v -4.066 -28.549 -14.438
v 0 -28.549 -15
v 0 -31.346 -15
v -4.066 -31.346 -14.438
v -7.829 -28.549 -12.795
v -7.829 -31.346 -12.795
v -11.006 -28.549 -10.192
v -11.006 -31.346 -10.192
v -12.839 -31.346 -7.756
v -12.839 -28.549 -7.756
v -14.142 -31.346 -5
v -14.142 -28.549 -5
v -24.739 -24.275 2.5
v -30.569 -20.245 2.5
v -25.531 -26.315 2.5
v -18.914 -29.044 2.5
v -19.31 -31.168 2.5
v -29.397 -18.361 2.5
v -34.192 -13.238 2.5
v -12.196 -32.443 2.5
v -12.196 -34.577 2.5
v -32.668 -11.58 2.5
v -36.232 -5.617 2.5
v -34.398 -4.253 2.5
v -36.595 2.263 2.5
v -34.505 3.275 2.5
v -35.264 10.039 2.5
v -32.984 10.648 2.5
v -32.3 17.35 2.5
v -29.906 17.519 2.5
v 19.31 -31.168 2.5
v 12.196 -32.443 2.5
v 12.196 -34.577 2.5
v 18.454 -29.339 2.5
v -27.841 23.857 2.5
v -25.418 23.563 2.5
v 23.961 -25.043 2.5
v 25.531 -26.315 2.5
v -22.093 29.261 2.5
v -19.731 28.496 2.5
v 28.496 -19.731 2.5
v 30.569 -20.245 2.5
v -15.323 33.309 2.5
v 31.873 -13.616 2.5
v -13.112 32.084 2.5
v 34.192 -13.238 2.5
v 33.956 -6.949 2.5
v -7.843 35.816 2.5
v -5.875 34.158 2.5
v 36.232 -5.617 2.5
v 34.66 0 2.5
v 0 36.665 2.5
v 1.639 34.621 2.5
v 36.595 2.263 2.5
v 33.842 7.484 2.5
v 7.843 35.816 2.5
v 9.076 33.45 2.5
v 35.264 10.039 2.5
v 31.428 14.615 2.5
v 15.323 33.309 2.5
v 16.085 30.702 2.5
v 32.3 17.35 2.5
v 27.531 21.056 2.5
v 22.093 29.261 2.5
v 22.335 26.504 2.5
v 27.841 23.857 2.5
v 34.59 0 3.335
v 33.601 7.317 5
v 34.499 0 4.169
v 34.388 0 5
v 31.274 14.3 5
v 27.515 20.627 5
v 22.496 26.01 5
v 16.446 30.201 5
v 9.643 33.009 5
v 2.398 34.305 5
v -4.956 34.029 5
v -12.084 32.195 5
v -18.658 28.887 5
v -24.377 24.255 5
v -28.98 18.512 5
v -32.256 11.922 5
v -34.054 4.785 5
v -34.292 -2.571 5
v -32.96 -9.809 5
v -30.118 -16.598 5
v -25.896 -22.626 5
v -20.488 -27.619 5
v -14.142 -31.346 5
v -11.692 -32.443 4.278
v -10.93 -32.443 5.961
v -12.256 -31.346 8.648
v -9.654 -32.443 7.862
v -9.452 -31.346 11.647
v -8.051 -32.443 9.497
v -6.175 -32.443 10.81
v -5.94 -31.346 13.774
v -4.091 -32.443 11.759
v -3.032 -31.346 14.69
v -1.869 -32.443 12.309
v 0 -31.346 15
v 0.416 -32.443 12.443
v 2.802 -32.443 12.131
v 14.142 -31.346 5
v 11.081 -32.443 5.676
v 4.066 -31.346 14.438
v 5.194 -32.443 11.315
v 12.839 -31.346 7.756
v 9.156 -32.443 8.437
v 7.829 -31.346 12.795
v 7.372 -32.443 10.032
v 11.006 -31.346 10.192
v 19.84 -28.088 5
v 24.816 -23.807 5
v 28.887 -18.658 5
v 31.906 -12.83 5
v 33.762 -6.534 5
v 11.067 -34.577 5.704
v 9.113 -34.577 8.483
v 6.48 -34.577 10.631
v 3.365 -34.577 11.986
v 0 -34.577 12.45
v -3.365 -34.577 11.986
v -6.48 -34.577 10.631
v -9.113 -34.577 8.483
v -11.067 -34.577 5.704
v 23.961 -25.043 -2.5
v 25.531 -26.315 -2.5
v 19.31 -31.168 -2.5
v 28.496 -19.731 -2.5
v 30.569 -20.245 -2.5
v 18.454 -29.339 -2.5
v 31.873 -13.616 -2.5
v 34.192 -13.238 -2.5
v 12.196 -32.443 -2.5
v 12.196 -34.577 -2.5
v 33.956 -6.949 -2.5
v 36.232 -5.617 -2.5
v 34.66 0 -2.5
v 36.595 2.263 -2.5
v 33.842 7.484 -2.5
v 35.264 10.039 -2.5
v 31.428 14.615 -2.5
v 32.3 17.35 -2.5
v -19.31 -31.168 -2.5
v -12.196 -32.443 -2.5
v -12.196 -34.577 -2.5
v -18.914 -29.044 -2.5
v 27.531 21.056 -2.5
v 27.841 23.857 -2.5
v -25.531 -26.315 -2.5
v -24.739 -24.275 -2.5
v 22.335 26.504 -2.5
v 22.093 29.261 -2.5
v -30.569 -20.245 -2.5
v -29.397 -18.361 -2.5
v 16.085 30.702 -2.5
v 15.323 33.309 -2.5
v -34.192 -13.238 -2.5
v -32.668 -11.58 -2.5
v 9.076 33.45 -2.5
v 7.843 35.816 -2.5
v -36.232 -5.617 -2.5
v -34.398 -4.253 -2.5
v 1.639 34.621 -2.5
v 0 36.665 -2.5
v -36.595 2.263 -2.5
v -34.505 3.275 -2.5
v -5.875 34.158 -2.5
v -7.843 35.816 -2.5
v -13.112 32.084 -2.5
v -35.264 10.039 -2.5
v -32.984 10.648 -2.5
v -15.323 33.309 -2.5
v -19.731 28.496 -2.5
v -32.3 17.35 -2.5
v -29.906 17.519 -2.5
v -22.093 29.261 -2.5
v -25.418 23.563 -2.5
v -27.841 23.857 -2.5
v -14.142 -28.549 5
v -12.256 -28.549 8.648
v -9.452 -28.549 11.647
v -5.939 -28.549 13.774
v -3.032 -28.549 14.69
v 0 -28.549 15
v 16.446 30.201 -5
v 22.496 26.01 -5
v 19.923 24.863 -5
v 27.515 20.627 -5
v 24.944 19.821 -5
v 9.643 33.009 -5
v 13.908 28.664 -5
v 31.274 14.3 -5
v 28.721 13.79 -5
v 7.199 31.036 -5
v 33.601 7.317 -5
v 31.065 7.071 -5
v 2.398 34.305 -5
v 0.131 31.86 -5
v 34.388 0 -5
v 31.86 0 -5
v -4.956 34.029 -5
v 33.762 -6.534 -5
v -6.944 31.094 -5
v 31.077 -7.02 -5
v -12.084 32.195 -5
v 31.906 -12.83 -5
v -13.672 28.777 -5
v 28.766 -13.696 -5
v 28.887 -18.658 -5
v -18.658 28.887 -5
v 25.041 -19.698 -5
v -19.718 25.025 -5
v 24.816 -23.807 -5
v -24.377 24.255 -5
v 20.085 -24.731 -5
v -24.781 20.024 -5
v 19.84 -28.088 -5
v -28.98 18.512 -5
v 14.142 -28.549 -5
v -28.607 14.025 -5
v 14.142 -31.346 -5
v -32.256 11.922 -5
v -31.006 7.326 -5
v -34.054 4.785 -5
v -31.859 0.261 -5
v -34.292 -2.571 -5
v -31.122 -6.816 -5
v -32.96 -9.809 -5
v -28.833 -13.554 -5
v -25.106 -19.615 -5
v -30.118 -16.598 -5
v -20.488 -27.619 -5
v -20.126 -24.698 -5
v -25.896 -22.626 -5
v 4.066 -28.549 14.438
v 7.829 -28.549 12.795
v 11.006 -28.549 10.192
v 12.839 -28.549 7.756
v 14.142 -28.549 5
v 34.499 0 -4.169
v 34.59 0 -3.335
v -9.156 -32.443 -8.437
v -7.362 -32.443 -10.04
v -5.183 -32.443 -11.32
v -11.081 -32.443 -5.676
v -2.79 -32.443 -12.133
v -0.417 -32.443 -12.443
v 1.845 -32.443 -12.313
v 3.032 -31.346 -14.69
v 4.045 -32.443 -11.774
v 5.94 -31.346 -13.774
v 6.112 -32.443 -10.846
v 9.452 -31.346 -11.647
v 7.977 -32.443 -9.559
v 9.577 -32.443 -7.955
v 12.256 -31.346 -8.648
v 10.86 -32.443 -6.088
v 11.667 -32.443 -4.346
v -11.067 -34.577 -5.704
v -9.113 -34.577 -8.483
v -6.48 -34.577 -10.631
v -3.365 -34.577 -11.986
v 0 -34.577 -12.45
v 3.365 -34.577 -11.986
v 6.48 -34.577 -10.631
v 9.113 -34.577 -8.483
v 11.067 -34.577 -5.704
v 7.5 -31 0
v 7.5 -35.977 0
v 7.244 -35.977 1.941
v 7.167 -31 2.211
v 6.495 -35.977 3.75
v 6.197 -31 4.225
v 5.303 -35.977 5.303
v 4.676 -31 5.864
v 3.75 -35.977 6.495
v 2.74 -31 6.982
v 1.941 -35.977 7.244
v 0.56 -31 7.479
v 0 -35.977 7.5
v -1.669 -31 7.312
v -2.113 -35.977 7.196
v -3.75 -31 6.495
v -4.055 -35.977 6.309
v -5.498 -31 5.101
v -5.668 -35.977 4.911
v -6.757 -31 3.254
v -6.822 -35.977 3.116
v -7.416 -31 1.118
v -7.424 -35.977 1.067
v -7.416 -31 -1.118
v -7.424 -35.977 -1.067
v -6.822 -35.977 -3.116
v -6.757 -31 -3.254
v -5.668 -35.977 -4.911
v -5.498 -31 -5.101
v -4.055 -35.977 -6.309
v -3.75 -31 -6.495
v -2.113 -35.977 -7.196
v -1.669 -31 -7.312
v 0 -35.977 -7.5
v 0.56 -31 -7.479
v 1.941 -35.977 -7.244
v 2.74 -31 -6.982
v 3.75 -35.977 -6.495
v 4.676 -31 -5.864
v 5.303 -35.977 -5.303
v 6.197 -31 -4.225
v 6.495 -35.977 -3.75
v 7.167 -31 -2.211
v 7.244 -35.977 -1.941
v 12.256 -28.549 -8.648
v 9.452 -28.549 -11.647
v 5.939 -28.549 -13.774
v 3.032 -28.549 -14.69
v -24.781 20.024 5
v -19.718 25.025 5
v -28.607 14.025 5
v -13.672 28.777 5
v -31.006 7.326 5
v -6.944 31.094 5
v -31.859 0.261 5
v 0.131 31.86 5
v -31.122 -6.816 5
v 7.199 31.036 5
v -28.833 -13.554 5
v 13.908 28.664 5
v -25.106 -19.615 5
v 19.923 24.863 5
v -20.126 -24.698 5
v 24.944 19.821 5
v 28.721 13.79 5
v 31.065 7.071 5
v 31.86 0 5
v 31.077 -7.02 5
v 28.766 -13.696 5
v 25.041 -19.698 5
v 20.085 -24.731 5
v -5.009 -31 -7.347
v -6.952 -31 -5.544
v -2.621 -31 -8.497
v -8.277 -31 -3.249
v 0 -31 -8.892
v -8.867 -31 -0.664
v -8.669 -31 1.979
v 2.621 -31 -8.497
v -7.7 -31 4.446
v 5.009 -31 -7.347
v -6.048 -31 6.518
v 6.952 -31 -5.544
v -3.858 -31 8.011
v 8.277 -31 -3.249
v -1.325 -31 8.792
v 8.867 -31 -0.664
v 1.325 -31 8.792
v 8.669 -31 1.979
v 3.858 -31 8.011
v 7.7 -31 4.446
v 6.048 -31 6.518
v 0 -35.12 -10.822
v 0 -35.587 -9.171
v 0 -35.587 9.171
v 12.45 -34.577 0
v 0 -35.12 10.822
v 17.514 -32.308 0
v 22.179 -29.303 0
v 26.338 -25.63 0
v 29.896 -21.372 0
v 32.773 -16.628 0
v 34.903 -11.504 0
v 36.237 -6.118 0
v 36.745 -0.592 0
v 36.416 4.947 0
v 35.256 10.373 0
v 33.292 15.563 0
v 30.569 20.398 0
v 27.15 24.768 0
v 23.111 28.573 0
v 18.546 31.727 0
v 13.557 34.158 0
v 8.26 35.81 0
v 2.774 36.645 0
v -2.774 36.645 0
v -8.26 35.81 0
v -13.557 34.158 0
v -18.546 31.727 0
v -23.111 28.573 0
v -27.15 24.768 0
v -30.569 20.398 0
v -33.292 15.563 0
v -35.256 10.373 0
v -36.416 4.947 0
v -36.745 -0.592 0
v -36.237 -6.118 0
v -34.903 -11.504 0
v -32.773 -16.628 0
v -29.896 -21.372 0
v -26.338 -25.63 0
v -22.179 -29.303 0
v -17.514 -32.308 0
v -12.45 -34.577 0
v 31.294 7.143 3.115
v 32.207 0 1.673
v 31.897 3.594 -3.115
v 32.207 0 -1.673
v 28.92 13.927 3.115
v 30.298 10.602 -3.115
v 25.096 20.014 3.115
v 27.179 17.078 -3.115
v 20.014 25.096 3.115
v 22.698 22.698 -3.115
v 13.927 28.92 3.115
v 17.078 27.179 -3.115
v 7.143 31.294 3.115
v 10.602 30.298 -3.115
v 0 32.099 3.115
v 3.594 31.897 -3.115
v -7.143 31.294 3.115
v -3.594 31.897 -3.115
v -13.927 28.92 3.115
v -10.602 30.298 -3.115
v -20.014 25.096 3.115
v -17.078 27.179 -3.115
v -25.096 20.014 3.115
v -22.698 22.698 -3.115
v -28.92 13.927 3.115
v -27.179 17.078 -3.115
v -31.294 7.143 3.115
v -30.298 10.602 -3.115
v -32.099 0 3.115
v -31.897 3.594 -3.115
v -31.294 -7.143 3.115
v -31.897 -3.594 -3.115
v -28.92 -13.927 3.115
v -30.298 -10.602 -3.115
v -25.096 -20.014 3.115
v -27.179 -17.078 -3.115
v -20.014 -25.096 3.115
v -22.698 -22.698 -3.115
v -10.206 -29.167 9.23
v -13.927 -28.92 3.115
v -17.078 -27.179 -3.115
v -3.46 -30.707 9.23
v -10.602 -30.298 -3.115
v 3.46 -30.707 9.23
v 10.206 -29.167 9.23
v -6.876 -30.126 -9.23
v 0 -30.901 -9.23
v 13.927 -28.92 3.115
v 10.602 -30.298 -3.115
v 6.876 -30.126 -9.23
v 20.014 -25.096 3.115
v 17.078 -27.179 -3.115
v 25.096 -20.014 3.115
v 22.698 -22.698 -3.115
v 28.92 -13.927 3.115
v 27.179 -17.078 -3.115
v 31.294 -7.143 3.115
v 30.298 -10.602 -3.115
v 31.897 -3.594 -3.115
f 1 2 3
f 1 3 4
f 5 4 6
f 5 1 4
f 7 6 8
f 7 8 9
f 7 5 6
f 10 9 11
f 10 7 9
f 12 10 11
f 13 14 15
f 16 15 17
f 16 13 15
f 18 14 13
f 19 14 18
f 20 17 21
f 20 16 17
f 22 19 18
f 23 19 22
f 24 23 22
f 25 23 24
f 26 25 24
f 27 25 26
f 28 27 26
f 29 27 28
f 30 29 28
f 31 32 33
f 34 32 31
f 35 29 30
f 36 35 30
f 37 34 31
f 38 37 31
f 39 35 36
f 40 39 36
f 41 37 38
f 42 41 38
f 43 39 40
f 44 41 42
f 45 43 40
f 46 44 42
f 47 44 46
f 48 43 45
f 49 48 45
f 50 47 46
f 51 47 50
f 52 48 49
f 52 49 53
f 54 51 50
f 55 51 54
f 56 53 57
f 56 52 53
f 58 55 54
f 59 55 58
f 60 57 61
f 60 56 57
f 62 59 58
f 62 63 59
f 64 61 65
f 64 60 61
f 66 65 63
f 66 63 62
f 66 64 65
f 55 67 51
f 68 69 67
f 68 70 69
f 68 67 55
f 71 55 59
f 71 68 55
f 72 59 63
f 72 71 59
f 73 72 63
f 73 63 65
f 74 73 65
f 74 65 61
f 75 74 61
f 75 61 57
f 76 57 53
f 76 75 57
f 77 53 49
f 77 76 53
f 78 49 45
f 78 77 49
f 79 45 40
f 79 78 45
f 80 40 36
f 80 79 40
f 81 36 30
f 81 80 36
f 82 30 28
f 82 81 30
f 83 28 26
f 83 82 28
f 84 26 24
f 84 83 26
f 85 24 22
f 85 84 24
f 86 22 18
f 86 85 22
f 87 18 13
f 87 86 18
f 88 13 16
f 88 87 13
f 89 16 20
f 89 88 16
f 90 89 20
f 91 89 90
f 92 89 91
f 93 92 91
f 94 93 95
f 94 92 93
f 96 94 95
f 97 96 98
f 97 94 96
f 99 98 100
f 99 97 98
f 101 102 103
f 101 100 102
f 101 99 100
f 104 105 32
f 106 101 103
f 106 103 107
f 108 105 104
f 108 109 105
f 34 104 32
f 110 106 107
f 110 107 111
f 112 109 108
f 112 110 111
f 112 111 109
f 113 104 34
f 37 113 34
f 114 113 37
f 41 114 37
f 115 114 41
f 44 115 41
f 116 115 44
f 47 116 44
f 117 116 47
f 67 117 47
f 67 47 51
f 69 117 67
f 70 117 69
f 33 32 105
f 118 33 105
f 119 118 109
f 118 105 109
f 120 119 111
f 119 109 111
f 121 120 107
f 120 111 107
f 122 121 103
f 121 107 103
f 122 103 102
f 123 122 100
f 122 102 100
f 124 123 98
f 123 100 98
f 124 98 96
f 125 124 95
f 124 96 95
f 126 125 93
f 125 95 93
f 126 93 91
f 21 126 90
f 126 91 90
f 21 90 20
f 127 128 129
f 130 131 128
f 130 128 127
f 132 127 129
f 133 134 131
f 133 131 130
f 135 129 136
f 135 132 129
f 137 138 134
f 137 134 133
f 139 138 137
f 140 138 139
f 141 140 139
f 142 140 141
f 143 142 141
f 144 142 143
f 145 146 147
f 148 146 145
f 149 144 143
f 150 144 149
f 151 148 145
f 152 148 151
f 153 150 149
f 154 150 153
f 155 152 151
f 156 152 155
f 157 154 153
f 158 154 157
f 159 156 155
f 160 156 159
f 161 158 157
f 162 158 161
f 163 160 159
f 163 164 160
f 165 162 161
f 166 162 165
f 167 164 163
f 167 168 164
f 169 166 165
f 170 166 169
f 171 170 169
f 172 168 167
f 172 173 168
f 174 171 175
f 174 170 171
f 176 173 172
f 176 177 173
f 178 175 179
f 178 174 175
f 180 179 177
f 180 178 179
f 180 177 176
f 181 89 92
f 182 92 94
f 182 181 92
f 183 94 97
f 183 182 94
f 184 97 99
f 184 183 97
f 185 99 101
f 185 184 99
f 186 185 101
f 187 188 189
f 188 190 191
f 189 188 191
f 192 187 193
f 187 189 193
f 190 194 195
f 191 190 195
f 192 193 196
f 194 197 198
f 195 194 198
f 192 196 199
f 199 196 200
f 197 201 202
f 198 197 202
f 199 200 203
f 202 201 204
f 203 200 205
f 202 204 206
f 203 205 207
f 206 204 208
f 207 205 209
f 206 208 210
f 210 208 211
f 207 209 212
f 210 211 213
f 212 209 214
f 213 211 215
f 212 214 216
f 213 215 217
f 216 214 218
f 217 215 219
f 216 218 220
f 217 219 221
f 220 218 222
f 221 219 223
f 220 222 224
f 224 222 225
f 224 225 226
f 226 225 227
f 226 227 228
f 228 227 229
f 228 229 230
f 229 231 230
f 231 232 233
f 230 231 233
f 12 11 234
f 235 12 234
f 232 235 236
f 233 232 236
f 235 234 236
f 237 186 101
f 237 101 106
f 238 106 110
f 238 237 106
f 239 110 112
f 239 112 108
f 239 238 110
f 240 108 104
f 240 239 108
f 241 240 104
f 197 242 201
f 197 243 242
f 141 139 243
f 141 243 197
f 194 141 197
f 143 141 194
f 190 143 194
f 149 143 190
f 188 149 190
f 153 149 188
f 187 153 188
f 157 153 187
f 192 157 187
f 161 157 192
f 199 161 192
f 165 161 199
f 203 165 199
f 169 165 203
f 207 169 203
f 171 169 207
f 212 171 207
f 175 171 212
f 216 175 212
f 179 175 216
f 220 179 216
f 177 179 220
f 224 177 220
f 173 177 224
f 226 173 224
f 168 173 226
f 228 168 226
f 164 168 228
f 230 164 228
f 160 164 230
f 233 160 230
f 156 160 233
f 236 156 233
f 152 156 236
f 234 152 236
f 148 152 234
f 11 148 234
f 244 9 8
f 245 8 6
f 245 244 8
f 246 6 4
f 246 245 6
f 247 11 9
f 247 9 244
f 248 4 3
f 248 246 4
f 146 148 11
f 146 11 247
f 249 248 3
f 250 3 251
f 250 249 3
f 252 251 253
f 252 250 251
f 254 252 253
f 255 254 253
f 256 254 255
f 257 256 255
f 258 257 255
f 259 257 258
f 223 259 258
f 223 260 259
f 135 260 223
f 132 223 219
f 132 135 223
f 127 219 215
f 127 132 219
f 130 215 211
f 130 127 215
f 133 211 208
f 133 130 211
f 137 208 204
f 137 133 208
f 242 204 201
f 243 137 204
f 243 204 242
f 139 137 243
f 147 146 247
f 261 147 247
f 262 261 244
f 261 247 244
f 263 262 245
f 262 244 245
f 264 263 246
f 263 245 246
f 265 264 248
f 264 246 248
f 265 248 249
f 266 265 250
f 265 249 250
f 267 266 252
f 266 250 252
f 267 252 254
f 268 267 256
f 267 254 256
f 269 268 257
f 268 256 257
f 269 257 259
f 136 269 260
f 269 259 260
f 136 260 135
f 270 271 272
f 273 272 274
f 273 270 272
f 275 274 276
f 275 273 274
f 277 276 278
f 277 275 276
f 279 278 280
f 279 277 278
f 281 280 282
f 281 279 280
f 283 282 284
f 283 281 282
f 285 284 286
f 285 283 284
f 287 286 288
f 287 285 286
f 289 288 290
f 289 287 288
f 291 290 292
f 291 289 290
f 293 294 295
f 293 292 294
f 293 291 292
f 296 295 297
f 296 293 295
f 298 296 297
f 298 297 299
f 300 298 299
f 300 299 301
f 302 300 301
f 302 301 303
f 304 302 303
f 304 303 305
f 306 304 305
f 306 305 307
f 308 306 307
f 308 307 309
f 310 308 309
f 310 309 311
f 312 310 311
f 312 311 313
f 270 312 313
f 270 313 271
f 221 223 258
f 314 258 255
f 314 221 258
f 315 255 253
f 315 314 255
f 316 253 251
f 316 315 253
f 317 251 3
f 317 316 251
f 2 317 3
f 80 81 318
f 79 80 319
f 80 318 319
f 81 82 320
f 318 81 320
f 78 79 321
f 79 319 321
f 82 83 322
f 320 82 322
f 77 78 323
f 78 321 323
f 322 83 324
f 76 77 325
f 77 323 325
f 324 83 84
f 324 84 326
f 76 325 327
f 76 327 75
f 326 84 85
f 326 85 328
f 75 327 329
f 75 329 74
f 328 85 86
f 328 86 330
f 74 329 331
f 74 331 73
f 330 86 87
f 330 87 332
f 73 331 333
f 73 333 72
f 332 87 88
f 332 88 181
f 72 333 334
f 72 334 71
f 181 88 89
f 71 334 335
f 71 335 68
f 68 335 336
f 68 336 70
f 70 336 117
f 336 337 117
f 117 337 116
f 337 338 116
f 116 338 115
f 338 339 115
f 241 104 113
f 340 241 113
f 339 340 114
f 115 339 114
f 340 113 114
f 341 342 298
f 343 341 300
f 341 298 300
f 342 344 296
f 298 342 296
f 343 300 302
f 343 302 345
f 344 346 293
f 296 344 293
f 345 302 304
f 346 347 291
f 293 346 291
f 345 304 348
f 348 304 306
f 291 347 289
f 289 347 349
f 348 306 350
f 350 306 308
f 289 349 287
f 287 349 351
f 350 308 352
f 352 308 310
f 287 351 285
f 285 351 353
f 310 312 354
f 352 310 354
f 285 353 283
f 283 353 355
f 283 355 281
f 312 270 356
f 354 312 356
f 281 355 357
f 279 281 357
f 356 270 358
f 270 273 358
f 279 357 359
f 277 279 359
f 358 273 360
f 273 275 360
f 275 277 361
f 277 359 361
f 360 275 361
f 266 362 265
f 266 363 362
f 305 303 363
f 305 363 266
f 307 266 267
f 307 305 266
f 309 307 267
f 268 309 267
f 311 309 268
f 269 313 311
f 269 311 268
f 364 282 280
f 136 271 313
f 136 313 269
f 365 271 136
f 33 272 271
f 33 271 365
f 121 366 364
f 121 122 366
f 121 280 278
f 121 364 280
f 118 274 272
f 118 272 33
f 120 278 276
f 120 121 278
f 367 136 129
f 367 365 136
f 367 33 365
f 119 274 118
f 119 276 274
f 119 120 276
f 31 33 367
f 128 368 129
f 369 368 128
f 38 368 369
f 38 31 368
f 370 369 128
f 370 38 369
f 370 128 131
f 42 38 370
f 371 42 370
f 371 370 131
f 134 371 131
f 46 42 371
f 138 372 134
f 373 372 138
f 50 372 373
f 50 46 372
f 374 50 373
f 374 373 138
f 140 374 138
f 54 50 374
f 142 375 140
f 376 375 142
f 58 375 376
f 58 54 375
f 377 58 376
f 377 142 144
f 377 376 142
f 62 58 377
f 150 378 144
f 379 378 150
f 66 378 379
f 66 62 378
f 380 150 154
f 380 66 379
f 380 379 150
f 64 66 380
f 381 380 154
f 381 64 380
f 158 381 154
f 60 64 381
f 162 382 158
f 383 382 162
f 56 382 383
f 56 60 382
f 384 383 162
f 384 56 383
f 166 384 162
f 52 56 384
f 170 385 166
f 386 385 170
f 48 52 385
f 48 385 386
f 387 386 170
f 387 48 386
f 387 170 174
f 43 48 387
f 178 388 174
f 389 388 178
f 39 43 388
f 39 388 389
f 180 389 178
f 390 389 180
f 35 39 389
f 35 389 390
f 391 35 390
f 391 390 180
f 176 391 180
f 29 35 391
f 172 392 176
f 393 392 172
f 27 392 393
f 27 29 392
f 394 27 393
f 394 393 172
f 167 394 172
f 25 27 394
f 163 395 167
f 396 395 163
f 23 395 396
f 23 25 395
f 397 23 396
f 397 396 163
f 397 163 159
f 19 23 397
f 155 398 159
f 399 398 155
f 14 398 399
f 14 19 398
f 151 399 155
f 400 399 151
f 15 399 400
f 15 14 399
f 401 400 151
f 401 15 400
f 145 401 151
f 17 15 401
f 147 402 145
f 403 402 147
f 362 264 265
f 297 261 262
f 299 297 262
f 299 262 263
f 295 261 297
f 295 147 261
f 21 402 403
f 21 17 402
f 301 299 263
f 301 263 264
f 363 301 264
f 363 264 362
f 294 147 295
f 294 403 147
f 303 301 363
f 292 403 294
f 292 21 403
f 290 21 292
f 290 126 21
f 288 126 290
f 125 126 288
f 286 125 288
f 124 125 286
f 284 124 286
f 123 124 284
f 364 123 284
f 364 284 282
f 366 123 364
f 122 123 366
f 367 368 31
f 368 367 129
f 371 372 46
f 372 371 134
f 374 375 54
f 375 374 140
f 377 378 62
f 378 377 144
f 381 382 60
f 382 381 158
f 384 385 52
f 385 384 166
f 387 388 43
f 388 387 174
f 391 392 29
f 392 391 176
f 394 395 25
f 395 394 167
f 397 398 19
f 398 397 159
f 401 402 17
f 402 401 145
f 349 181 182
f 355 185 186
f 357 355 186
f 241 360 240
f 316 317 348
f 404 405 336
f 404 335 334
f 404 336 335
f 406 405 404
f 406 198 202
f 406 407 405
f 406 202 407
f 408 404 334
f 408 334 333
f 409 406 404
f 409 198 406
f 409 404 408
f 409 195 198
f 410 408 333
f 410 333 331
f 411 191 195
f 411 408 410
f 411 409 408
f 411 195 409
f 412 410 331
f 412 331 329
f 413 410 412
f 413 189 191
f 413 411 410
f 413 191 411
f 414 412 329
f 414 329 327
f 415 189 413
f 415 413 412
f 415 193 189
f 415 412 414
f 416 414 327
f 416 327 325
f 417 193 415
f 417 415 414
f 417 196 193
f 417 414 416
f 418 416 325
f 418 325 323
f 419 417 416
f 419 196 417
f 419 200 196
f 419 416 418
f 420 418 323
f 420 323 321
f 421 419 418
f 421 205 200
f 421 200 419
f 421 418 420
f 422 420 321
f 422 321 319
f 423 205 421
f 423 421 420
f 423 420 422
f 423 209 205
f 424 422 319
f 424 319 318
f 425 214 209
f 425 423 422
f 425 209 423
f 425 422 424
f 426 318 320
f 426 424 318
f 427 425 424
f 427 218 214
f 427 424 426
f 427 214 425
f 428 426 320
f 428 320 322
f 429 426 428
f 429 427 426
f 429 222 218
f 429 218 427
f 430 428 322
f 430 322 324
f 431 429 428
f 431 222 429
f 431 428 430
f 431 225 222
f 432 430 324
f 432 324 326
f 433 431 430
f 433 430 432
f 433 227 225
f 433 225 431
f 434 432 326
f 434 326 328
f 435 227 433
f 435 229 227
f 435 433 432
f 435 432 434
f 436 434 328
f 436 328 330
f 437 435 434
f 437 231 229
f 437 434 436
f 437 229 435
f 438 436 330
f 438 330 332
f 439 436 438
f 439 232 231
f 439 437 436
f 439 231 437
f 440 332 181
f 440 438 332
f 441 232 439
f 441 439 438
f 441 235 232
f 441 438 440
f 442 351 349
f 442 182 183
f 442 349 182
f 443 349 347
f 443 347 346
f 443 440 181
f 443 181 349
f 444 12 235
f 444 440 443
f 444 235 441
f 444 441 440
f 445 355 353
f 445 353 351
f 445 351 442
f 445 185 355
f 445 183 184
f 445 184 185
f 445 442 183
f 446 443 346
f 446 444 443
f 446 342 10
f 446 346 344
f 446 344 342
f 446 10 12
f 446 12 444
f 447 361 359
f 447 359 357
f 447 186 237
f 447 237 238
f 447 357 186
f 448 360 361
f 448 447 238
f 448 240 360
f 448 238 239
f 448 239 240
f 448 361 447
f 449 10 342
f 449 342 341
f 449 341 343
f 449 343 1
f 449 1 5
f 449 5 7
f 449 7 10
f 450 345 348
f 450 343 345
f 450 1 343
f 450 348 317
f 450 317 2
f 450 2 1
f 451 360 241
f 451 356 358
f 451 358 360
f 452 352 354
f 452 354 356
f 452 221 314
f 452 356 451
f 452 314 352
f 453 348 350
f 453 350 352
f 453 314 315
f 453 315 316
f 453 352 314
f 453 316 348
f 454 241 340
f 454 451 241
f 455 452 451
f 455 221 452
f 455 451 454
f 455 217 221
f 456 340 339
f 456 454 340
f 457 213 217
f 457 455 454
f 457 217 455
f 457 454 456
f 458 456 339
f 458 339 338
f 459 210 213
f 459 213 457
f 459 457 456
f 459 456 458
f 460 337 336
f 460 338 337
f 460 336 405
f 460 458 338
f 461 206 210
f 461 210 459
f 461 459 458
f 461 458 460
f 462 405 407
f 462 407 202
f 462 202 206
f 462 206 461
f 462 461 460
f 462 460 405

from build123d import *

# Parameters (mm, degrees)
F3_DEPTH       = 34.751
F3_DEPTH_BACK  = 34.751
F5_ANGLE_BACK  = 30
F5_ANGLE       = 60
F9_R           = 12.45
F10_DEPTH      = 8
F13_R          = 7.5
F14_DEPTH      = 10
F14_DEPTH_BACK = 10


with BuildPart() as f1:
    # F0 (on Front) → F1 (revolve)
    with BuildSketch(Plane.XZ):
        with BuildLine():
            Line((0, -32.25), (0, -34.75))
            ThreePointArc((0, -34.75), (34.75, 0), (0, 34.75))
            Line((0, 34.75), (0, 32.25))
            ThreePointArc((0, 32.25), (32.25, 0), (0, -32.25))
        make_face()
    revolve(axis=Axis((0, 0, 0), (0, 0, 1)))

    # F2 (on Front) → F3 (cut, two sides)
    with BuildSketch(Plane.XZ) as f3_sk:
        with BuildLine():
            ThreePointArc((0, 15), (8.6602540378, 12.2474487139), (14.1421356237, 5))
            Line((14.1421356237, 5), (47.8319227695, 5))
            Line((47.8319227695, 5), (47.8319227695, 37.9324257374))
            Line((47.8319227695, 37.9324257374), (0, 37.9324257374))
            Line((0, 37.9324257374), (0, 15))
        make_face()
        with BuildLine():
            ThreePointArc((-14.1421356237, 5), (-8.6602540378, 12.2474487139), (0, 15))
            Line((0, 15), (0, 37.9324257374))
            Line((0, 37.9324257374), (-47.8319227695, 37.9324257374))
            Line((-47.8319227695, 37.9324257374), (-47.8319227695, 5))
            Line((-47.8319227695, 5), (-14.1421356237, 5))
        make_face()
        with BuildLine():
            Line((-14.1421356237, -5), (-47.8319227695, -5))
            Line((-47.8319227695, -5), (-47.8319227695, -37.9324257374))
            Line((-47.8319227695, -37.9324257374), (0, -37.9324257374))
            Line((0, -37.9324257374), (47.8319227695, -37.9324257374))
            Line((47.8319227695, -37.9324257374), (47.8319227695, -5))
            Line((47.8319227695, -5), (14.1421356237, -5))
            ThreePointArc((14.1421356237, -5), (8.6602540378, -12.2474487139), (0, -15))
            ThreePointArc((0, -15), (-8.6602540378, -12.2474487139), (-14.1421356237, -5))
        make_face()
    extrude(amount=-F3_DEPTH, mode=Mode.SUBTRACT)
    extrude(f3_sk.sketch, amount=F3_DEPTH_BACK, mode=Mode.SUBTRACT)

    # F4 (on Right) → F5 (revolve, cut)
    with BuildSketch(Plane.YZ, mode=Mode.PRIVATE) as f5_sk:
        Polygon((28.549299466, 5), (31.3458529953, 5), (38.3678488433, 5), (38.3678488433, 15), (31.3458529953, 15), (28.549299466, 15), align=None)
        Polygon((38.3678488433, -5), (31.3458529953, -5), (28.549299466, -5), (28.549299466, -15), (31.3458529953, -15), (38.3678488433, -15), align=None)
    revolve(f5_sk.sketch.rotate(Axis((0, 0, 13.6671056971), (0, 0, 1)), -F5_ANGLE_BACK), axis=Axis((0, 0, 13.6671056971), (0, 0, 1)), revolution_arc=F5_ANGLE, mode=Mode.SUBTRACT)

    # F6 (on Front) → F8 (revolve)
    with BuildSketch(Plane.XZ):
        Polygon((36.75, 0), (36.75, 2.5), (33.5848033428, 2.5), (33.5848033428, 0), (33.5848033428, -2.5), (36.75, -2.5), align=None)
    revolve(axis=Axis((0, 0, 0), (0, 0, 1)))

    # F9 (on offset) → F10 (join)
    with BuildSketch(Plane.XZ.offset(31)):
        Circle(F9_R)
    extrude(amount=F10_DEPTH)

    # F11 (on Right) → F12 (revolve, cut)
    with BuildSketch(Plane.YZ):
        with BuildLine():
            ThreePointArc((0, -36.75), (-36.75, 0), (0, 36.75))
            Line((0, 36.75), (0, 45.6979585941))
            ThreePointArc((0, 45.6979585941), (-45.6979585941, 0), (0, -45.6979585941))
            Line((0, -45.6979585941), (0, -36.75))
        make_face()
    revolve(axis=Axis((0, 0, 0), (0, 0, 1)), mode=Mode.SUBTRACT)

    # F13 (on offset) → F14 (cut, two sides)
    with BuildSketch(Plane.XZ.offset(31)) as f14_sk:
        Circle(F13_R)
    extrude(amount=-F14_DEPTH, mode=Mode.SUBTRACT)
    extrude(f14_sk.sketch, amount=F14_DEPTH_BACK, mode=Mode.SUBTRACT)


solid = f1.part
